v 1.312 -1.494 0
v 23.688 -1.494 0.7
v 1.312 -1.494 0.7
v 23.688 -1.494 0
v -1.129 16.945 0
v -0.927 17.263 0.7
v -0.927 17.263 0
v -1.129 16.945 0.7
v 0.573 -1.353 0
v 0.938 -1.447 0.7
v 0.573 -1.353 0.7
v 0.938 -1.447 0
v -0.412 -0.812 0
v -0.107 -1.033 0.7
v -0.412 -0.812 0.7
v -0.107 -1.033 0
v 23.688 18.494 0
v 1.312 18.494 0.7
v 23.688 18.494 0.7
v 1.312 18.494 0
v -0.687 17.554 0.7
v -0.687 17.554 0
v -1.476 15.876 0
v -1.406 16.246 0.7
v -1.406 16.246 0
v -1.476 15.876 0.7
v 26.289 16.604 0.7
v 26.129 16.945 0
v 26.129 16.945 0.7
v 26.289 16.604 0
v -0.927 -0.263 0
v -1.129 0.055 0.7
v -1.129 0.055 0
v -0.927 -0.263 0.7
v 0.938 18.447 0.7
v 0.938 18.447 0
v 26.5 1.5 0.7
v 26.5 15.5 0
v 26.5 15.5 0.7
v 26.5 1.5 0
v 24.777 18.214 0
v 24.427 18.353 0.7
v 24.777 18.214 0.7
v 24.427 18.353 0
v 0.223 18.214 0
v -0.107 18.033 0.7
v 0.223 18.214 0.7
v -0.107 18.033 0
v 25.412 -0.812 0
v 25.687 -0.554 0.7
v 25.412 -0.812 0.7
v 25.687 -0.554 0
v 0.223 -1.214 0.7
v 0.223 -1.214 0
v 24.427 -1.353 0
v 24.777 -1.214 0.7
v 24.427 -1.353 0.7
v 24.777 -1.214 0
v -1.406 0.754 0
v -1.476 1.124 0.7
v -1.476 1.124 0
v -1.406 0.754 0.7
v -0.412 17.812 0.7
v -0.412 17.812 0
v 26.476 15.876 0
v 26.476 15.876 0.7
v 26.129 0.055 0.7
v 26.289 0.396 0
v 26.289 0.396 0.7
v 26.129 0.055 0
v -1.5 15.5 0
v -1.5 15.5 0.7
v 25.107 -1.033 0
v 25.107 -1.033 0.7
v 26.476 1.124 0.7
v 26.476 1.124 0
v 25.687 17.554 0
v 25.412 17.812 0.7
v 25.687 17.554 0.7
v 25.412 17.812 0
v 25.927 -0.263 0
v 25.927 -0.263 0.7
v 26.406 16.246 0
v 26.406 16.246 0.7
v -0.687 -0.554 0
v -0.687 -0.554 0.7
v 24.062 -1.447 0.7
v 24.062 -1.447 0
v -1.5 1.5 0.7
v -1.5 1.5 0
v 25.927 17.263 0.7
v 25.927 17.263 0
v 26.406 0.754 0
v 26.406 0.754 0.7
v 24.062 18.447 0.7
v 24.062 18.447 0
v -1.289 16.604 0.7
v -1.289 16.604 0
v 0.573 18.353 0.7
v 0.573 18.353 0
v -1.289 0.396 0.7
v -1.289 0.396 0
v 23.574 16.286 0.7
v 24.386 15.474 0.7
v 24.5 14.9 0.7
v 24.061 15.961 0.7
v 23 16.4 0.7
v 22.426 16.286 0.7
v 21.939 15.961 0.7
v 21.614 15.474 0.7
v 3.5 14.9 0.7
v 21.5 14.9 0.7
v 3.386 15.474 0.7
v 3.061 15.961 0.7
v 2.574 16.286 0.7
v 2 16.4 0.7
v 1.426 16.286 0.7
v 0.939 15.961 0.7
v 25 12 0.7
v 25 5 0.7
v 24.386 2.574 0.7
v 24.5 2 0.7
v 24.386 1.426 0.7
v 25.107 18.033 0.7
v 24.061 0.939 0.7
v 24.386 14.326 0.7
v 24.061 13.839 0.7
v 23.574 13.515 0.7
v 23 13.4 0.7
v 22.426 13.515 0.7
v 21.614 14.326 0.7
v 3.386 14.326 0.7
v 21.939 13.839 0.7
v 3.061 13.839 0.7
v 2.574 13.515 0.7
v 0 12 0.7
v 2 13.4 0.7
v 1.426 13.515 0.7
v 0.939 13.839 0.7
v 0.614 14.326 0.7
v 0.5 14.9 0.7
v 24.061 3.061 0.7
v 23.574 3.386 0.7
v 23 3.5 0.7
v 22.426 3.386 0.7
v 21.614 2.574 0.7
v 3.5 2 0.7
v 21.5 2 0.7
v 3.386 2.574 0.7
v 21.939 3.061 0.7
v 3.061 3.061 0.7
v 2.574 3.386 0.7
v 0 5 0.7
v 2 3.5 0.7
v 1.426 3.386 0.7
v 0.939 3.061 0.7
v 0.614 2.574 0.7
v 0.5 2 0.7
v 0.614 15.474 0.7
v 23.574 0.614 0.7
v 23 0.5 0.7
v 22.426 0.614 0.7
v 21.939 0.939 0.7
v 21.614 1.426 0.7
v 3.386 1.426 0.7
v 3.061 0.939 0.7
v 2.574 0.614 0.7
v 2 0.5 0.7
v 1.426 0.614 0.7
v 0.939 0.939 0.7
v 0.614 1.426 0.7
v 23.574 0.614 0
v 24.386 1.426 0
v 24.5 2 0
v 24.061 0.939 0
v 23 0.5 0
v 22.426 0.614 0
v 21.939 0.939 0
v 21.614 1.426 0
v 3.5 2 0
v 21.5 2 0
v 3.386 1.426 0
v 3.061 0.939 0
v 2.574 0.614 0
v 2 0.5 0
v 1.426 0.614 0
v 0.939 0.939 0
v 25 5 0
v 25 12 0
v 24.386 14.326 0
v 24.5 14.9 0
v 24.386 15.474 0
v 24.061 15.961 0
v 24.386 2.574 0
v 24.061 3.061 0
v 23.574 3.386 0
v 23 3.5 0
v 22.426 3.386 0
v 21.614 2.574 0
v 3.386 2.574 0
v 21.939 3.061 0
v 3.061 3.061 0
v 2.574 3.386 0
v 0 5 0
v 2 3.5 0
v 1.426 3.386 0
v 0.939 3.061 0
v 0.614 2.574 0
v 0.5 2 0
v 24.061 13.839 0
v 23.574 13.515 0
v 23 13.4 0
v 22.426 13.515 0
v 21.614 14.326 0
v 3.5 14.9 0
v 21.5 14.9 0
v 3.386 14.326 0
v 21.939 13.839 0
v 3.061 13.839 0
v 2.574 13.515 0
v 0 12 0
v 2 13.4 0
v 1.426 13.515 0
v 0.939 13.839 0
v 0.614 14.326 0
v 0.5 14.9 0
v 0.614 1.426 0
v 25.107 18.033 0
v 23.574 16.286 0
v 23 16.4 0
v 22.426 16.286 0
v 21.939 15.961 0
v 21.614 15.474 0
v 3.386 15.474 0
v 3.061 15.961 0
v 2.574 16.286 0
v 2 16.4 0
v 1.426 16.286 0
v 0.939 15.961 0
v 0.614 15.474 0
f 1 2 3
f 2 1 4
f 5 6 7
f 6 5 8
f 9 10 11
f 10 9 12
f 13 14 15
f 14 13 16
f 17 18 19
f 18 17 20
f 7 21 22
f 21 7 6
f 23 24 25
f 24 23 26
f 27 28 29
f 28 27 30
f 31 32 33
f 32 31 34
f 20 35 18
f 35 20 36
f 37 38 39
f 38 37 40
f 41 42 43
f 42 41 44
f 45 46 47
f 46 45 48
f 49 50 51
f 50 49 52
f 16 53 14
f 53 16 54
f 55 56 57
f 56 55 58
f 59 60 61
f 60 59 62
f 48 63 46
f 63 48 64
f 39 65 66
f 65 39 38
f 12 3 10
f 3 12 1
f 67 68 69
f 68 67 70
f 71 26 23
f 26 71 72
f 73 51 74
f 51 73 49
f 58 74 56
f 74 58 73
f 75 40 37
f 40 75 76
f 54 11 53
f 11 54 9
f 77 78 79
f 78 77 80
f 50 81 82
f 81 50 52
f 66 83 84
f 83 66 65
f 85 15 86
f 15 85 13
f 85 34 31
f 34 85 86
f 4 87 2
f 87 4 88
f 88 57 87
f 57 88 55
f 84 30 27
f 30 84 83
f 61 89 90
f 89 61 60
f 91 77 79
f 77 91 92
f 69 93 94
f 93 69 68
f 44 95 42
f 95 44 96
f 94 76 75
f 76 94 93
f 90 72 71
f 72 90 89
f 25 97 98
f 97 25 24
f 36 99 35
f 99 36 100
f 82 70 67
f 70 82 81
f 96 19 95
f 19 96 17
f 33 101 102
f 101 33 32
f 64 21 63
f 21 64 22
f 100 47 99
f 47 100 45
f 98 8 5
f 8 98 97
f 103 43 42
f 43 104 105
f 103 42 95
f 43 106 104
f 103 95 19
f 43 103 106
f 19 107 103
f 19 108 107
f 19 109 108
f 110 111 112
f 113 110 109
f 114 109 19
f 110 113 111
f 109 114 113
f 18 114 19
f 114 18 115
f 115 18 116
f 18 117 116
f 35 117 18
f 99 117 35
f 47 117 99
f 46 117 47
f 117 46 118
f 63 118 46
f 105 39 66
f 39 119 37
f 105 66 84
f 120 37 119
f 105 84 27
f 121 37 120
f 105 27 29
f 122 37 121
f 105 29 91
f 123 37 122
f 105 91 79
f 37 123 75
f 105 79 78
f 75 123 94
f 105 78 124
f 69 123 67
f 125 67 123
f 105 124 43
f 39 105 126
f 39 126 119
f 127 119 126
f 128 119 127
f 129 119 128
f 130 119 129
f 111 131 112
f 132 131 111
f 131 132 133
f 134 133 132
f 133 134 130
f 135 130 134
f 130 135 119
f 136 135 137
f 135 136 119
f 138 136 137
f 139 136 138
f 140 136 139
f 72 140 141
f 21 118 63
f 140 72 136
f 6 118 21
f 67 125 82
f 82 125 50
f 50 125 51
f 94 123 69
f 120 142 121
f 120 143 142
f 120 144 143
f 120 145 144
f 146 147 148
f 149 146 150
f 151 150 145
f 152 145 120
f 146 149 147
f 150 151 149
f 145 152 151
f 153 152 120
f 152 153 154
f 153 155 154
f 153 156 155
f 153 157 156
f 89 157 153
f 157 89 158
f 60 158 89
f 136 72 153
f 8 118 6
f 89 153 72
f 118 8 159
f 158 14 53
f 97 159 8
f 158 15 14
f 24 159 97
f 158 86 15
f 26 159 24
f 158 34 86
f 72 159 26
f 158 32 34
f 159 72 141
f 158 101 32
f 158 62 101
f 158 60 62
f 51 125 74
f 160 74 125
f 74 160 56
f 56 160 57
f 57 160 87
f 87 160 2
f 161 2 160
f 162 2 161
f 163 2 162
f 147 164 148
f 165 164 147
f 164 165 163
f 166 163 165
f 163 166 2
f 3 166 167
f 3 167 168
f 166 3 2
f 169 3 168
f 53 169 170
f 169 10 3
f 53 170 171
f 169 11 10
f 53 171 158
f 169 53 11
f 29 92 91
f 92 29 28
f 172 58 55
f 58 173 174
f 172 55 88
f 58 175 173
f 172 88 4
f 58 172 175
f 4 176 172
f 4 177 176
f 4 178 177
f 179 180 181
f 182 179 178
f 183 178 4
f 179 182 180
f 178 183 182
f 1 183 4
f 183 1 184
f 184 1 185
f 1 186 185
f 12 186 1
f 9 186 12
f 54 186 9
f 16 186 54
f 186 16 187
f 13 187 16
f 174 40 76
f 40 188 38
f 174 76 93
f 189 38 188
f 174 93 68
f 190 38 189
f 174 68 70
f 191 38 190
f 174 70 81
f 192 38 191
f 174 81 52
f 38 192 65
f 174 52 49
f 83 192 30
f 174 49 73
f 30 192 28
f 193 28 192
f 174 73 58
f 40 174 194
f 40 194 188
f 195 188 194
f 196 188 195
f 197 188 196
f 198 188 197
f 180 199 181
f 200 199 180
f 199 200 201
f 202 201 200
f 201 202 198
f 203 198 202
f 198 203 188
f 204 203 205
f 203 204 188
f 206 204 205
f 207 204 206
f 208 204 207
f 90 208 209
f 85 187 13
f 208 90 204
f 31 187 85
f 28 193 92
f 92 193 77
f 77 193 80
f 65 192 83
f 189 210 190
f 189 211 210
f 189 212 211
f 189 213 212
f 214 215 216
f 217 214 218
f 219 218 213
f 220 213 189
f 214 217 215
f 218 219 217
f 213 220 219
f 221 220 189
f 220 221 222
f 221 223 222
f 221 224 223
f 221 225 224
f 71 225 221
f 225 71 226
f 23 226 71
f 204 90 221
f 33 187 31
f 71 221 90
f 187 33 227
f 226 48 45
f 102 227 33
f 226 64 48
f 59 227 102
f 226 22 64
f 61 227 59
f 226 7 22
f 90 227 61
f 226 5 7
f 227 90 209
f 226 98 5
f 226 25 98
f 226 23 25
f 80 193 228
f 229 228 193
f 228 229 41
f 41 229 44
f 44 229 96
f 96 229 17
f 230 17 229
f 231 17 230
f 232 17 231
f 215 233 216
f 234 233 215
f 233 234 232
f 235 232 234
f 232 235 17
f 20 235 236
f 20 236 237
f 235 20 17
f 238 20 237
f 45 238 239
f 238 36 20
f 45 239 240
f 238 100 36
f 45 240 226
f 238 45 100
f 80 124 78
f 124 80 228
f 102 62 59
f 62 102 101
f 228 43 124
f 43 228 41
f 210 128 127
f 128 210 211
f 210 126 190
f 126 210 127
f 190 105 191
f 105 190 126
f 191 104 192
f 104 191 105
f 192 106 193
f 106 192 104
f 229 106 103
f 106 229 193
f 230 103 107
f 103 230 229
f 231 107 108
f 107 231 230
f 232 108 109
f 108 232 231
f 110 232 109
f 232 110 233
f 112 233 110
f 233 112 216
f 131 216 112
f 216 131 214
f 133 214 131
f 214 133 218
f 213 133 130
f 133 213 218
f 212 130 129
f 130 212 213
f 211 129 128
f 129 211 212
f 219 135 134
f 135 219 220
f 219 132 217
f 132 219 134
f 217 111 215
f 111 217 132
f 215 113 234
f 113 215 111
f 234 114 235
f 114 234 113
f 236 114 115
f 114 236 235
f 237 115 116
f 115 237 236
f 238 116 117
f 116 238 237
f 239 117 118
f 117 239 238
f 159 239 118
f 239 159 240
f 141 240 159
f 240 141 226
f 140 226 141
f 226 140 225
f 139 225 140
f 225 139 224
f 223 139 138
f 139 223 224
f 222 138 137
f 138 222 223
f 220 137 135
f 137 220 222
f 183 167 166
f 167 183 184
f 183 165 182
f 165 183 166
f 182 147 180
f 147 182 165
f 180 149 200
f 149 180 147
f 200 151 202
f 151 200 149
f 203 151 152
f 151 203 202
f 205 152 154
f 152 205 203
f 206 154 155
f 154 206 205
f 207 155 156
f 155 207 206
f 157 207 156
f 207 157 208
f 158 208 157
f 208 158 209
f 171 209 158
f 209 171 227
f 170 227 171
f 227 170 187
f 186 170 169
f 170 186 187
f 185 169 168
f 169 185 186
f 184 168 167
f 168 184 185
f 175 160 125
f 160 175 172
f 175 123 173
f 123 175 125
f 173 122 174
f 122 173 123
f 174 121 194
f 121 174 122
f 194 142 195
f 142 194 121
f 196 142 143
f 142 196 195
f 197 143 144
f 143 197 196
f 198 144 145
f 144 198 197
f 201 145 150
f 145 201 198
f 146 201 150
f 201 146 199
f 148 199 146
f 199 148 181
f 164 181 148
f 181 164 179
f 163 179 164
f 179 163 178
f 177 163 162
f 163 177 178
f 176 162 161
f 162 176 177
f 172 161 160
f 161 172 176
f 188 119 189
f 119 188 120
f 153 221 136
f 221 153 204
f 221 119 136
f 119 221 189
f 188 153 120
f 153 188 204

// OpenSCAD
//Cam V1_3
$fn=50;
difference(){
translate([1.5,1.5,0])
minkowski()
{
  cube([22,14,0.35]);
  cylinder(r=3,h=0.35);
}

linear_extrude(10)
import("../dxf/Cam_V1_3_holes.dxf", $fn=16);
translate([0,5,-0.5])
	cube([25,7,2]);
}
